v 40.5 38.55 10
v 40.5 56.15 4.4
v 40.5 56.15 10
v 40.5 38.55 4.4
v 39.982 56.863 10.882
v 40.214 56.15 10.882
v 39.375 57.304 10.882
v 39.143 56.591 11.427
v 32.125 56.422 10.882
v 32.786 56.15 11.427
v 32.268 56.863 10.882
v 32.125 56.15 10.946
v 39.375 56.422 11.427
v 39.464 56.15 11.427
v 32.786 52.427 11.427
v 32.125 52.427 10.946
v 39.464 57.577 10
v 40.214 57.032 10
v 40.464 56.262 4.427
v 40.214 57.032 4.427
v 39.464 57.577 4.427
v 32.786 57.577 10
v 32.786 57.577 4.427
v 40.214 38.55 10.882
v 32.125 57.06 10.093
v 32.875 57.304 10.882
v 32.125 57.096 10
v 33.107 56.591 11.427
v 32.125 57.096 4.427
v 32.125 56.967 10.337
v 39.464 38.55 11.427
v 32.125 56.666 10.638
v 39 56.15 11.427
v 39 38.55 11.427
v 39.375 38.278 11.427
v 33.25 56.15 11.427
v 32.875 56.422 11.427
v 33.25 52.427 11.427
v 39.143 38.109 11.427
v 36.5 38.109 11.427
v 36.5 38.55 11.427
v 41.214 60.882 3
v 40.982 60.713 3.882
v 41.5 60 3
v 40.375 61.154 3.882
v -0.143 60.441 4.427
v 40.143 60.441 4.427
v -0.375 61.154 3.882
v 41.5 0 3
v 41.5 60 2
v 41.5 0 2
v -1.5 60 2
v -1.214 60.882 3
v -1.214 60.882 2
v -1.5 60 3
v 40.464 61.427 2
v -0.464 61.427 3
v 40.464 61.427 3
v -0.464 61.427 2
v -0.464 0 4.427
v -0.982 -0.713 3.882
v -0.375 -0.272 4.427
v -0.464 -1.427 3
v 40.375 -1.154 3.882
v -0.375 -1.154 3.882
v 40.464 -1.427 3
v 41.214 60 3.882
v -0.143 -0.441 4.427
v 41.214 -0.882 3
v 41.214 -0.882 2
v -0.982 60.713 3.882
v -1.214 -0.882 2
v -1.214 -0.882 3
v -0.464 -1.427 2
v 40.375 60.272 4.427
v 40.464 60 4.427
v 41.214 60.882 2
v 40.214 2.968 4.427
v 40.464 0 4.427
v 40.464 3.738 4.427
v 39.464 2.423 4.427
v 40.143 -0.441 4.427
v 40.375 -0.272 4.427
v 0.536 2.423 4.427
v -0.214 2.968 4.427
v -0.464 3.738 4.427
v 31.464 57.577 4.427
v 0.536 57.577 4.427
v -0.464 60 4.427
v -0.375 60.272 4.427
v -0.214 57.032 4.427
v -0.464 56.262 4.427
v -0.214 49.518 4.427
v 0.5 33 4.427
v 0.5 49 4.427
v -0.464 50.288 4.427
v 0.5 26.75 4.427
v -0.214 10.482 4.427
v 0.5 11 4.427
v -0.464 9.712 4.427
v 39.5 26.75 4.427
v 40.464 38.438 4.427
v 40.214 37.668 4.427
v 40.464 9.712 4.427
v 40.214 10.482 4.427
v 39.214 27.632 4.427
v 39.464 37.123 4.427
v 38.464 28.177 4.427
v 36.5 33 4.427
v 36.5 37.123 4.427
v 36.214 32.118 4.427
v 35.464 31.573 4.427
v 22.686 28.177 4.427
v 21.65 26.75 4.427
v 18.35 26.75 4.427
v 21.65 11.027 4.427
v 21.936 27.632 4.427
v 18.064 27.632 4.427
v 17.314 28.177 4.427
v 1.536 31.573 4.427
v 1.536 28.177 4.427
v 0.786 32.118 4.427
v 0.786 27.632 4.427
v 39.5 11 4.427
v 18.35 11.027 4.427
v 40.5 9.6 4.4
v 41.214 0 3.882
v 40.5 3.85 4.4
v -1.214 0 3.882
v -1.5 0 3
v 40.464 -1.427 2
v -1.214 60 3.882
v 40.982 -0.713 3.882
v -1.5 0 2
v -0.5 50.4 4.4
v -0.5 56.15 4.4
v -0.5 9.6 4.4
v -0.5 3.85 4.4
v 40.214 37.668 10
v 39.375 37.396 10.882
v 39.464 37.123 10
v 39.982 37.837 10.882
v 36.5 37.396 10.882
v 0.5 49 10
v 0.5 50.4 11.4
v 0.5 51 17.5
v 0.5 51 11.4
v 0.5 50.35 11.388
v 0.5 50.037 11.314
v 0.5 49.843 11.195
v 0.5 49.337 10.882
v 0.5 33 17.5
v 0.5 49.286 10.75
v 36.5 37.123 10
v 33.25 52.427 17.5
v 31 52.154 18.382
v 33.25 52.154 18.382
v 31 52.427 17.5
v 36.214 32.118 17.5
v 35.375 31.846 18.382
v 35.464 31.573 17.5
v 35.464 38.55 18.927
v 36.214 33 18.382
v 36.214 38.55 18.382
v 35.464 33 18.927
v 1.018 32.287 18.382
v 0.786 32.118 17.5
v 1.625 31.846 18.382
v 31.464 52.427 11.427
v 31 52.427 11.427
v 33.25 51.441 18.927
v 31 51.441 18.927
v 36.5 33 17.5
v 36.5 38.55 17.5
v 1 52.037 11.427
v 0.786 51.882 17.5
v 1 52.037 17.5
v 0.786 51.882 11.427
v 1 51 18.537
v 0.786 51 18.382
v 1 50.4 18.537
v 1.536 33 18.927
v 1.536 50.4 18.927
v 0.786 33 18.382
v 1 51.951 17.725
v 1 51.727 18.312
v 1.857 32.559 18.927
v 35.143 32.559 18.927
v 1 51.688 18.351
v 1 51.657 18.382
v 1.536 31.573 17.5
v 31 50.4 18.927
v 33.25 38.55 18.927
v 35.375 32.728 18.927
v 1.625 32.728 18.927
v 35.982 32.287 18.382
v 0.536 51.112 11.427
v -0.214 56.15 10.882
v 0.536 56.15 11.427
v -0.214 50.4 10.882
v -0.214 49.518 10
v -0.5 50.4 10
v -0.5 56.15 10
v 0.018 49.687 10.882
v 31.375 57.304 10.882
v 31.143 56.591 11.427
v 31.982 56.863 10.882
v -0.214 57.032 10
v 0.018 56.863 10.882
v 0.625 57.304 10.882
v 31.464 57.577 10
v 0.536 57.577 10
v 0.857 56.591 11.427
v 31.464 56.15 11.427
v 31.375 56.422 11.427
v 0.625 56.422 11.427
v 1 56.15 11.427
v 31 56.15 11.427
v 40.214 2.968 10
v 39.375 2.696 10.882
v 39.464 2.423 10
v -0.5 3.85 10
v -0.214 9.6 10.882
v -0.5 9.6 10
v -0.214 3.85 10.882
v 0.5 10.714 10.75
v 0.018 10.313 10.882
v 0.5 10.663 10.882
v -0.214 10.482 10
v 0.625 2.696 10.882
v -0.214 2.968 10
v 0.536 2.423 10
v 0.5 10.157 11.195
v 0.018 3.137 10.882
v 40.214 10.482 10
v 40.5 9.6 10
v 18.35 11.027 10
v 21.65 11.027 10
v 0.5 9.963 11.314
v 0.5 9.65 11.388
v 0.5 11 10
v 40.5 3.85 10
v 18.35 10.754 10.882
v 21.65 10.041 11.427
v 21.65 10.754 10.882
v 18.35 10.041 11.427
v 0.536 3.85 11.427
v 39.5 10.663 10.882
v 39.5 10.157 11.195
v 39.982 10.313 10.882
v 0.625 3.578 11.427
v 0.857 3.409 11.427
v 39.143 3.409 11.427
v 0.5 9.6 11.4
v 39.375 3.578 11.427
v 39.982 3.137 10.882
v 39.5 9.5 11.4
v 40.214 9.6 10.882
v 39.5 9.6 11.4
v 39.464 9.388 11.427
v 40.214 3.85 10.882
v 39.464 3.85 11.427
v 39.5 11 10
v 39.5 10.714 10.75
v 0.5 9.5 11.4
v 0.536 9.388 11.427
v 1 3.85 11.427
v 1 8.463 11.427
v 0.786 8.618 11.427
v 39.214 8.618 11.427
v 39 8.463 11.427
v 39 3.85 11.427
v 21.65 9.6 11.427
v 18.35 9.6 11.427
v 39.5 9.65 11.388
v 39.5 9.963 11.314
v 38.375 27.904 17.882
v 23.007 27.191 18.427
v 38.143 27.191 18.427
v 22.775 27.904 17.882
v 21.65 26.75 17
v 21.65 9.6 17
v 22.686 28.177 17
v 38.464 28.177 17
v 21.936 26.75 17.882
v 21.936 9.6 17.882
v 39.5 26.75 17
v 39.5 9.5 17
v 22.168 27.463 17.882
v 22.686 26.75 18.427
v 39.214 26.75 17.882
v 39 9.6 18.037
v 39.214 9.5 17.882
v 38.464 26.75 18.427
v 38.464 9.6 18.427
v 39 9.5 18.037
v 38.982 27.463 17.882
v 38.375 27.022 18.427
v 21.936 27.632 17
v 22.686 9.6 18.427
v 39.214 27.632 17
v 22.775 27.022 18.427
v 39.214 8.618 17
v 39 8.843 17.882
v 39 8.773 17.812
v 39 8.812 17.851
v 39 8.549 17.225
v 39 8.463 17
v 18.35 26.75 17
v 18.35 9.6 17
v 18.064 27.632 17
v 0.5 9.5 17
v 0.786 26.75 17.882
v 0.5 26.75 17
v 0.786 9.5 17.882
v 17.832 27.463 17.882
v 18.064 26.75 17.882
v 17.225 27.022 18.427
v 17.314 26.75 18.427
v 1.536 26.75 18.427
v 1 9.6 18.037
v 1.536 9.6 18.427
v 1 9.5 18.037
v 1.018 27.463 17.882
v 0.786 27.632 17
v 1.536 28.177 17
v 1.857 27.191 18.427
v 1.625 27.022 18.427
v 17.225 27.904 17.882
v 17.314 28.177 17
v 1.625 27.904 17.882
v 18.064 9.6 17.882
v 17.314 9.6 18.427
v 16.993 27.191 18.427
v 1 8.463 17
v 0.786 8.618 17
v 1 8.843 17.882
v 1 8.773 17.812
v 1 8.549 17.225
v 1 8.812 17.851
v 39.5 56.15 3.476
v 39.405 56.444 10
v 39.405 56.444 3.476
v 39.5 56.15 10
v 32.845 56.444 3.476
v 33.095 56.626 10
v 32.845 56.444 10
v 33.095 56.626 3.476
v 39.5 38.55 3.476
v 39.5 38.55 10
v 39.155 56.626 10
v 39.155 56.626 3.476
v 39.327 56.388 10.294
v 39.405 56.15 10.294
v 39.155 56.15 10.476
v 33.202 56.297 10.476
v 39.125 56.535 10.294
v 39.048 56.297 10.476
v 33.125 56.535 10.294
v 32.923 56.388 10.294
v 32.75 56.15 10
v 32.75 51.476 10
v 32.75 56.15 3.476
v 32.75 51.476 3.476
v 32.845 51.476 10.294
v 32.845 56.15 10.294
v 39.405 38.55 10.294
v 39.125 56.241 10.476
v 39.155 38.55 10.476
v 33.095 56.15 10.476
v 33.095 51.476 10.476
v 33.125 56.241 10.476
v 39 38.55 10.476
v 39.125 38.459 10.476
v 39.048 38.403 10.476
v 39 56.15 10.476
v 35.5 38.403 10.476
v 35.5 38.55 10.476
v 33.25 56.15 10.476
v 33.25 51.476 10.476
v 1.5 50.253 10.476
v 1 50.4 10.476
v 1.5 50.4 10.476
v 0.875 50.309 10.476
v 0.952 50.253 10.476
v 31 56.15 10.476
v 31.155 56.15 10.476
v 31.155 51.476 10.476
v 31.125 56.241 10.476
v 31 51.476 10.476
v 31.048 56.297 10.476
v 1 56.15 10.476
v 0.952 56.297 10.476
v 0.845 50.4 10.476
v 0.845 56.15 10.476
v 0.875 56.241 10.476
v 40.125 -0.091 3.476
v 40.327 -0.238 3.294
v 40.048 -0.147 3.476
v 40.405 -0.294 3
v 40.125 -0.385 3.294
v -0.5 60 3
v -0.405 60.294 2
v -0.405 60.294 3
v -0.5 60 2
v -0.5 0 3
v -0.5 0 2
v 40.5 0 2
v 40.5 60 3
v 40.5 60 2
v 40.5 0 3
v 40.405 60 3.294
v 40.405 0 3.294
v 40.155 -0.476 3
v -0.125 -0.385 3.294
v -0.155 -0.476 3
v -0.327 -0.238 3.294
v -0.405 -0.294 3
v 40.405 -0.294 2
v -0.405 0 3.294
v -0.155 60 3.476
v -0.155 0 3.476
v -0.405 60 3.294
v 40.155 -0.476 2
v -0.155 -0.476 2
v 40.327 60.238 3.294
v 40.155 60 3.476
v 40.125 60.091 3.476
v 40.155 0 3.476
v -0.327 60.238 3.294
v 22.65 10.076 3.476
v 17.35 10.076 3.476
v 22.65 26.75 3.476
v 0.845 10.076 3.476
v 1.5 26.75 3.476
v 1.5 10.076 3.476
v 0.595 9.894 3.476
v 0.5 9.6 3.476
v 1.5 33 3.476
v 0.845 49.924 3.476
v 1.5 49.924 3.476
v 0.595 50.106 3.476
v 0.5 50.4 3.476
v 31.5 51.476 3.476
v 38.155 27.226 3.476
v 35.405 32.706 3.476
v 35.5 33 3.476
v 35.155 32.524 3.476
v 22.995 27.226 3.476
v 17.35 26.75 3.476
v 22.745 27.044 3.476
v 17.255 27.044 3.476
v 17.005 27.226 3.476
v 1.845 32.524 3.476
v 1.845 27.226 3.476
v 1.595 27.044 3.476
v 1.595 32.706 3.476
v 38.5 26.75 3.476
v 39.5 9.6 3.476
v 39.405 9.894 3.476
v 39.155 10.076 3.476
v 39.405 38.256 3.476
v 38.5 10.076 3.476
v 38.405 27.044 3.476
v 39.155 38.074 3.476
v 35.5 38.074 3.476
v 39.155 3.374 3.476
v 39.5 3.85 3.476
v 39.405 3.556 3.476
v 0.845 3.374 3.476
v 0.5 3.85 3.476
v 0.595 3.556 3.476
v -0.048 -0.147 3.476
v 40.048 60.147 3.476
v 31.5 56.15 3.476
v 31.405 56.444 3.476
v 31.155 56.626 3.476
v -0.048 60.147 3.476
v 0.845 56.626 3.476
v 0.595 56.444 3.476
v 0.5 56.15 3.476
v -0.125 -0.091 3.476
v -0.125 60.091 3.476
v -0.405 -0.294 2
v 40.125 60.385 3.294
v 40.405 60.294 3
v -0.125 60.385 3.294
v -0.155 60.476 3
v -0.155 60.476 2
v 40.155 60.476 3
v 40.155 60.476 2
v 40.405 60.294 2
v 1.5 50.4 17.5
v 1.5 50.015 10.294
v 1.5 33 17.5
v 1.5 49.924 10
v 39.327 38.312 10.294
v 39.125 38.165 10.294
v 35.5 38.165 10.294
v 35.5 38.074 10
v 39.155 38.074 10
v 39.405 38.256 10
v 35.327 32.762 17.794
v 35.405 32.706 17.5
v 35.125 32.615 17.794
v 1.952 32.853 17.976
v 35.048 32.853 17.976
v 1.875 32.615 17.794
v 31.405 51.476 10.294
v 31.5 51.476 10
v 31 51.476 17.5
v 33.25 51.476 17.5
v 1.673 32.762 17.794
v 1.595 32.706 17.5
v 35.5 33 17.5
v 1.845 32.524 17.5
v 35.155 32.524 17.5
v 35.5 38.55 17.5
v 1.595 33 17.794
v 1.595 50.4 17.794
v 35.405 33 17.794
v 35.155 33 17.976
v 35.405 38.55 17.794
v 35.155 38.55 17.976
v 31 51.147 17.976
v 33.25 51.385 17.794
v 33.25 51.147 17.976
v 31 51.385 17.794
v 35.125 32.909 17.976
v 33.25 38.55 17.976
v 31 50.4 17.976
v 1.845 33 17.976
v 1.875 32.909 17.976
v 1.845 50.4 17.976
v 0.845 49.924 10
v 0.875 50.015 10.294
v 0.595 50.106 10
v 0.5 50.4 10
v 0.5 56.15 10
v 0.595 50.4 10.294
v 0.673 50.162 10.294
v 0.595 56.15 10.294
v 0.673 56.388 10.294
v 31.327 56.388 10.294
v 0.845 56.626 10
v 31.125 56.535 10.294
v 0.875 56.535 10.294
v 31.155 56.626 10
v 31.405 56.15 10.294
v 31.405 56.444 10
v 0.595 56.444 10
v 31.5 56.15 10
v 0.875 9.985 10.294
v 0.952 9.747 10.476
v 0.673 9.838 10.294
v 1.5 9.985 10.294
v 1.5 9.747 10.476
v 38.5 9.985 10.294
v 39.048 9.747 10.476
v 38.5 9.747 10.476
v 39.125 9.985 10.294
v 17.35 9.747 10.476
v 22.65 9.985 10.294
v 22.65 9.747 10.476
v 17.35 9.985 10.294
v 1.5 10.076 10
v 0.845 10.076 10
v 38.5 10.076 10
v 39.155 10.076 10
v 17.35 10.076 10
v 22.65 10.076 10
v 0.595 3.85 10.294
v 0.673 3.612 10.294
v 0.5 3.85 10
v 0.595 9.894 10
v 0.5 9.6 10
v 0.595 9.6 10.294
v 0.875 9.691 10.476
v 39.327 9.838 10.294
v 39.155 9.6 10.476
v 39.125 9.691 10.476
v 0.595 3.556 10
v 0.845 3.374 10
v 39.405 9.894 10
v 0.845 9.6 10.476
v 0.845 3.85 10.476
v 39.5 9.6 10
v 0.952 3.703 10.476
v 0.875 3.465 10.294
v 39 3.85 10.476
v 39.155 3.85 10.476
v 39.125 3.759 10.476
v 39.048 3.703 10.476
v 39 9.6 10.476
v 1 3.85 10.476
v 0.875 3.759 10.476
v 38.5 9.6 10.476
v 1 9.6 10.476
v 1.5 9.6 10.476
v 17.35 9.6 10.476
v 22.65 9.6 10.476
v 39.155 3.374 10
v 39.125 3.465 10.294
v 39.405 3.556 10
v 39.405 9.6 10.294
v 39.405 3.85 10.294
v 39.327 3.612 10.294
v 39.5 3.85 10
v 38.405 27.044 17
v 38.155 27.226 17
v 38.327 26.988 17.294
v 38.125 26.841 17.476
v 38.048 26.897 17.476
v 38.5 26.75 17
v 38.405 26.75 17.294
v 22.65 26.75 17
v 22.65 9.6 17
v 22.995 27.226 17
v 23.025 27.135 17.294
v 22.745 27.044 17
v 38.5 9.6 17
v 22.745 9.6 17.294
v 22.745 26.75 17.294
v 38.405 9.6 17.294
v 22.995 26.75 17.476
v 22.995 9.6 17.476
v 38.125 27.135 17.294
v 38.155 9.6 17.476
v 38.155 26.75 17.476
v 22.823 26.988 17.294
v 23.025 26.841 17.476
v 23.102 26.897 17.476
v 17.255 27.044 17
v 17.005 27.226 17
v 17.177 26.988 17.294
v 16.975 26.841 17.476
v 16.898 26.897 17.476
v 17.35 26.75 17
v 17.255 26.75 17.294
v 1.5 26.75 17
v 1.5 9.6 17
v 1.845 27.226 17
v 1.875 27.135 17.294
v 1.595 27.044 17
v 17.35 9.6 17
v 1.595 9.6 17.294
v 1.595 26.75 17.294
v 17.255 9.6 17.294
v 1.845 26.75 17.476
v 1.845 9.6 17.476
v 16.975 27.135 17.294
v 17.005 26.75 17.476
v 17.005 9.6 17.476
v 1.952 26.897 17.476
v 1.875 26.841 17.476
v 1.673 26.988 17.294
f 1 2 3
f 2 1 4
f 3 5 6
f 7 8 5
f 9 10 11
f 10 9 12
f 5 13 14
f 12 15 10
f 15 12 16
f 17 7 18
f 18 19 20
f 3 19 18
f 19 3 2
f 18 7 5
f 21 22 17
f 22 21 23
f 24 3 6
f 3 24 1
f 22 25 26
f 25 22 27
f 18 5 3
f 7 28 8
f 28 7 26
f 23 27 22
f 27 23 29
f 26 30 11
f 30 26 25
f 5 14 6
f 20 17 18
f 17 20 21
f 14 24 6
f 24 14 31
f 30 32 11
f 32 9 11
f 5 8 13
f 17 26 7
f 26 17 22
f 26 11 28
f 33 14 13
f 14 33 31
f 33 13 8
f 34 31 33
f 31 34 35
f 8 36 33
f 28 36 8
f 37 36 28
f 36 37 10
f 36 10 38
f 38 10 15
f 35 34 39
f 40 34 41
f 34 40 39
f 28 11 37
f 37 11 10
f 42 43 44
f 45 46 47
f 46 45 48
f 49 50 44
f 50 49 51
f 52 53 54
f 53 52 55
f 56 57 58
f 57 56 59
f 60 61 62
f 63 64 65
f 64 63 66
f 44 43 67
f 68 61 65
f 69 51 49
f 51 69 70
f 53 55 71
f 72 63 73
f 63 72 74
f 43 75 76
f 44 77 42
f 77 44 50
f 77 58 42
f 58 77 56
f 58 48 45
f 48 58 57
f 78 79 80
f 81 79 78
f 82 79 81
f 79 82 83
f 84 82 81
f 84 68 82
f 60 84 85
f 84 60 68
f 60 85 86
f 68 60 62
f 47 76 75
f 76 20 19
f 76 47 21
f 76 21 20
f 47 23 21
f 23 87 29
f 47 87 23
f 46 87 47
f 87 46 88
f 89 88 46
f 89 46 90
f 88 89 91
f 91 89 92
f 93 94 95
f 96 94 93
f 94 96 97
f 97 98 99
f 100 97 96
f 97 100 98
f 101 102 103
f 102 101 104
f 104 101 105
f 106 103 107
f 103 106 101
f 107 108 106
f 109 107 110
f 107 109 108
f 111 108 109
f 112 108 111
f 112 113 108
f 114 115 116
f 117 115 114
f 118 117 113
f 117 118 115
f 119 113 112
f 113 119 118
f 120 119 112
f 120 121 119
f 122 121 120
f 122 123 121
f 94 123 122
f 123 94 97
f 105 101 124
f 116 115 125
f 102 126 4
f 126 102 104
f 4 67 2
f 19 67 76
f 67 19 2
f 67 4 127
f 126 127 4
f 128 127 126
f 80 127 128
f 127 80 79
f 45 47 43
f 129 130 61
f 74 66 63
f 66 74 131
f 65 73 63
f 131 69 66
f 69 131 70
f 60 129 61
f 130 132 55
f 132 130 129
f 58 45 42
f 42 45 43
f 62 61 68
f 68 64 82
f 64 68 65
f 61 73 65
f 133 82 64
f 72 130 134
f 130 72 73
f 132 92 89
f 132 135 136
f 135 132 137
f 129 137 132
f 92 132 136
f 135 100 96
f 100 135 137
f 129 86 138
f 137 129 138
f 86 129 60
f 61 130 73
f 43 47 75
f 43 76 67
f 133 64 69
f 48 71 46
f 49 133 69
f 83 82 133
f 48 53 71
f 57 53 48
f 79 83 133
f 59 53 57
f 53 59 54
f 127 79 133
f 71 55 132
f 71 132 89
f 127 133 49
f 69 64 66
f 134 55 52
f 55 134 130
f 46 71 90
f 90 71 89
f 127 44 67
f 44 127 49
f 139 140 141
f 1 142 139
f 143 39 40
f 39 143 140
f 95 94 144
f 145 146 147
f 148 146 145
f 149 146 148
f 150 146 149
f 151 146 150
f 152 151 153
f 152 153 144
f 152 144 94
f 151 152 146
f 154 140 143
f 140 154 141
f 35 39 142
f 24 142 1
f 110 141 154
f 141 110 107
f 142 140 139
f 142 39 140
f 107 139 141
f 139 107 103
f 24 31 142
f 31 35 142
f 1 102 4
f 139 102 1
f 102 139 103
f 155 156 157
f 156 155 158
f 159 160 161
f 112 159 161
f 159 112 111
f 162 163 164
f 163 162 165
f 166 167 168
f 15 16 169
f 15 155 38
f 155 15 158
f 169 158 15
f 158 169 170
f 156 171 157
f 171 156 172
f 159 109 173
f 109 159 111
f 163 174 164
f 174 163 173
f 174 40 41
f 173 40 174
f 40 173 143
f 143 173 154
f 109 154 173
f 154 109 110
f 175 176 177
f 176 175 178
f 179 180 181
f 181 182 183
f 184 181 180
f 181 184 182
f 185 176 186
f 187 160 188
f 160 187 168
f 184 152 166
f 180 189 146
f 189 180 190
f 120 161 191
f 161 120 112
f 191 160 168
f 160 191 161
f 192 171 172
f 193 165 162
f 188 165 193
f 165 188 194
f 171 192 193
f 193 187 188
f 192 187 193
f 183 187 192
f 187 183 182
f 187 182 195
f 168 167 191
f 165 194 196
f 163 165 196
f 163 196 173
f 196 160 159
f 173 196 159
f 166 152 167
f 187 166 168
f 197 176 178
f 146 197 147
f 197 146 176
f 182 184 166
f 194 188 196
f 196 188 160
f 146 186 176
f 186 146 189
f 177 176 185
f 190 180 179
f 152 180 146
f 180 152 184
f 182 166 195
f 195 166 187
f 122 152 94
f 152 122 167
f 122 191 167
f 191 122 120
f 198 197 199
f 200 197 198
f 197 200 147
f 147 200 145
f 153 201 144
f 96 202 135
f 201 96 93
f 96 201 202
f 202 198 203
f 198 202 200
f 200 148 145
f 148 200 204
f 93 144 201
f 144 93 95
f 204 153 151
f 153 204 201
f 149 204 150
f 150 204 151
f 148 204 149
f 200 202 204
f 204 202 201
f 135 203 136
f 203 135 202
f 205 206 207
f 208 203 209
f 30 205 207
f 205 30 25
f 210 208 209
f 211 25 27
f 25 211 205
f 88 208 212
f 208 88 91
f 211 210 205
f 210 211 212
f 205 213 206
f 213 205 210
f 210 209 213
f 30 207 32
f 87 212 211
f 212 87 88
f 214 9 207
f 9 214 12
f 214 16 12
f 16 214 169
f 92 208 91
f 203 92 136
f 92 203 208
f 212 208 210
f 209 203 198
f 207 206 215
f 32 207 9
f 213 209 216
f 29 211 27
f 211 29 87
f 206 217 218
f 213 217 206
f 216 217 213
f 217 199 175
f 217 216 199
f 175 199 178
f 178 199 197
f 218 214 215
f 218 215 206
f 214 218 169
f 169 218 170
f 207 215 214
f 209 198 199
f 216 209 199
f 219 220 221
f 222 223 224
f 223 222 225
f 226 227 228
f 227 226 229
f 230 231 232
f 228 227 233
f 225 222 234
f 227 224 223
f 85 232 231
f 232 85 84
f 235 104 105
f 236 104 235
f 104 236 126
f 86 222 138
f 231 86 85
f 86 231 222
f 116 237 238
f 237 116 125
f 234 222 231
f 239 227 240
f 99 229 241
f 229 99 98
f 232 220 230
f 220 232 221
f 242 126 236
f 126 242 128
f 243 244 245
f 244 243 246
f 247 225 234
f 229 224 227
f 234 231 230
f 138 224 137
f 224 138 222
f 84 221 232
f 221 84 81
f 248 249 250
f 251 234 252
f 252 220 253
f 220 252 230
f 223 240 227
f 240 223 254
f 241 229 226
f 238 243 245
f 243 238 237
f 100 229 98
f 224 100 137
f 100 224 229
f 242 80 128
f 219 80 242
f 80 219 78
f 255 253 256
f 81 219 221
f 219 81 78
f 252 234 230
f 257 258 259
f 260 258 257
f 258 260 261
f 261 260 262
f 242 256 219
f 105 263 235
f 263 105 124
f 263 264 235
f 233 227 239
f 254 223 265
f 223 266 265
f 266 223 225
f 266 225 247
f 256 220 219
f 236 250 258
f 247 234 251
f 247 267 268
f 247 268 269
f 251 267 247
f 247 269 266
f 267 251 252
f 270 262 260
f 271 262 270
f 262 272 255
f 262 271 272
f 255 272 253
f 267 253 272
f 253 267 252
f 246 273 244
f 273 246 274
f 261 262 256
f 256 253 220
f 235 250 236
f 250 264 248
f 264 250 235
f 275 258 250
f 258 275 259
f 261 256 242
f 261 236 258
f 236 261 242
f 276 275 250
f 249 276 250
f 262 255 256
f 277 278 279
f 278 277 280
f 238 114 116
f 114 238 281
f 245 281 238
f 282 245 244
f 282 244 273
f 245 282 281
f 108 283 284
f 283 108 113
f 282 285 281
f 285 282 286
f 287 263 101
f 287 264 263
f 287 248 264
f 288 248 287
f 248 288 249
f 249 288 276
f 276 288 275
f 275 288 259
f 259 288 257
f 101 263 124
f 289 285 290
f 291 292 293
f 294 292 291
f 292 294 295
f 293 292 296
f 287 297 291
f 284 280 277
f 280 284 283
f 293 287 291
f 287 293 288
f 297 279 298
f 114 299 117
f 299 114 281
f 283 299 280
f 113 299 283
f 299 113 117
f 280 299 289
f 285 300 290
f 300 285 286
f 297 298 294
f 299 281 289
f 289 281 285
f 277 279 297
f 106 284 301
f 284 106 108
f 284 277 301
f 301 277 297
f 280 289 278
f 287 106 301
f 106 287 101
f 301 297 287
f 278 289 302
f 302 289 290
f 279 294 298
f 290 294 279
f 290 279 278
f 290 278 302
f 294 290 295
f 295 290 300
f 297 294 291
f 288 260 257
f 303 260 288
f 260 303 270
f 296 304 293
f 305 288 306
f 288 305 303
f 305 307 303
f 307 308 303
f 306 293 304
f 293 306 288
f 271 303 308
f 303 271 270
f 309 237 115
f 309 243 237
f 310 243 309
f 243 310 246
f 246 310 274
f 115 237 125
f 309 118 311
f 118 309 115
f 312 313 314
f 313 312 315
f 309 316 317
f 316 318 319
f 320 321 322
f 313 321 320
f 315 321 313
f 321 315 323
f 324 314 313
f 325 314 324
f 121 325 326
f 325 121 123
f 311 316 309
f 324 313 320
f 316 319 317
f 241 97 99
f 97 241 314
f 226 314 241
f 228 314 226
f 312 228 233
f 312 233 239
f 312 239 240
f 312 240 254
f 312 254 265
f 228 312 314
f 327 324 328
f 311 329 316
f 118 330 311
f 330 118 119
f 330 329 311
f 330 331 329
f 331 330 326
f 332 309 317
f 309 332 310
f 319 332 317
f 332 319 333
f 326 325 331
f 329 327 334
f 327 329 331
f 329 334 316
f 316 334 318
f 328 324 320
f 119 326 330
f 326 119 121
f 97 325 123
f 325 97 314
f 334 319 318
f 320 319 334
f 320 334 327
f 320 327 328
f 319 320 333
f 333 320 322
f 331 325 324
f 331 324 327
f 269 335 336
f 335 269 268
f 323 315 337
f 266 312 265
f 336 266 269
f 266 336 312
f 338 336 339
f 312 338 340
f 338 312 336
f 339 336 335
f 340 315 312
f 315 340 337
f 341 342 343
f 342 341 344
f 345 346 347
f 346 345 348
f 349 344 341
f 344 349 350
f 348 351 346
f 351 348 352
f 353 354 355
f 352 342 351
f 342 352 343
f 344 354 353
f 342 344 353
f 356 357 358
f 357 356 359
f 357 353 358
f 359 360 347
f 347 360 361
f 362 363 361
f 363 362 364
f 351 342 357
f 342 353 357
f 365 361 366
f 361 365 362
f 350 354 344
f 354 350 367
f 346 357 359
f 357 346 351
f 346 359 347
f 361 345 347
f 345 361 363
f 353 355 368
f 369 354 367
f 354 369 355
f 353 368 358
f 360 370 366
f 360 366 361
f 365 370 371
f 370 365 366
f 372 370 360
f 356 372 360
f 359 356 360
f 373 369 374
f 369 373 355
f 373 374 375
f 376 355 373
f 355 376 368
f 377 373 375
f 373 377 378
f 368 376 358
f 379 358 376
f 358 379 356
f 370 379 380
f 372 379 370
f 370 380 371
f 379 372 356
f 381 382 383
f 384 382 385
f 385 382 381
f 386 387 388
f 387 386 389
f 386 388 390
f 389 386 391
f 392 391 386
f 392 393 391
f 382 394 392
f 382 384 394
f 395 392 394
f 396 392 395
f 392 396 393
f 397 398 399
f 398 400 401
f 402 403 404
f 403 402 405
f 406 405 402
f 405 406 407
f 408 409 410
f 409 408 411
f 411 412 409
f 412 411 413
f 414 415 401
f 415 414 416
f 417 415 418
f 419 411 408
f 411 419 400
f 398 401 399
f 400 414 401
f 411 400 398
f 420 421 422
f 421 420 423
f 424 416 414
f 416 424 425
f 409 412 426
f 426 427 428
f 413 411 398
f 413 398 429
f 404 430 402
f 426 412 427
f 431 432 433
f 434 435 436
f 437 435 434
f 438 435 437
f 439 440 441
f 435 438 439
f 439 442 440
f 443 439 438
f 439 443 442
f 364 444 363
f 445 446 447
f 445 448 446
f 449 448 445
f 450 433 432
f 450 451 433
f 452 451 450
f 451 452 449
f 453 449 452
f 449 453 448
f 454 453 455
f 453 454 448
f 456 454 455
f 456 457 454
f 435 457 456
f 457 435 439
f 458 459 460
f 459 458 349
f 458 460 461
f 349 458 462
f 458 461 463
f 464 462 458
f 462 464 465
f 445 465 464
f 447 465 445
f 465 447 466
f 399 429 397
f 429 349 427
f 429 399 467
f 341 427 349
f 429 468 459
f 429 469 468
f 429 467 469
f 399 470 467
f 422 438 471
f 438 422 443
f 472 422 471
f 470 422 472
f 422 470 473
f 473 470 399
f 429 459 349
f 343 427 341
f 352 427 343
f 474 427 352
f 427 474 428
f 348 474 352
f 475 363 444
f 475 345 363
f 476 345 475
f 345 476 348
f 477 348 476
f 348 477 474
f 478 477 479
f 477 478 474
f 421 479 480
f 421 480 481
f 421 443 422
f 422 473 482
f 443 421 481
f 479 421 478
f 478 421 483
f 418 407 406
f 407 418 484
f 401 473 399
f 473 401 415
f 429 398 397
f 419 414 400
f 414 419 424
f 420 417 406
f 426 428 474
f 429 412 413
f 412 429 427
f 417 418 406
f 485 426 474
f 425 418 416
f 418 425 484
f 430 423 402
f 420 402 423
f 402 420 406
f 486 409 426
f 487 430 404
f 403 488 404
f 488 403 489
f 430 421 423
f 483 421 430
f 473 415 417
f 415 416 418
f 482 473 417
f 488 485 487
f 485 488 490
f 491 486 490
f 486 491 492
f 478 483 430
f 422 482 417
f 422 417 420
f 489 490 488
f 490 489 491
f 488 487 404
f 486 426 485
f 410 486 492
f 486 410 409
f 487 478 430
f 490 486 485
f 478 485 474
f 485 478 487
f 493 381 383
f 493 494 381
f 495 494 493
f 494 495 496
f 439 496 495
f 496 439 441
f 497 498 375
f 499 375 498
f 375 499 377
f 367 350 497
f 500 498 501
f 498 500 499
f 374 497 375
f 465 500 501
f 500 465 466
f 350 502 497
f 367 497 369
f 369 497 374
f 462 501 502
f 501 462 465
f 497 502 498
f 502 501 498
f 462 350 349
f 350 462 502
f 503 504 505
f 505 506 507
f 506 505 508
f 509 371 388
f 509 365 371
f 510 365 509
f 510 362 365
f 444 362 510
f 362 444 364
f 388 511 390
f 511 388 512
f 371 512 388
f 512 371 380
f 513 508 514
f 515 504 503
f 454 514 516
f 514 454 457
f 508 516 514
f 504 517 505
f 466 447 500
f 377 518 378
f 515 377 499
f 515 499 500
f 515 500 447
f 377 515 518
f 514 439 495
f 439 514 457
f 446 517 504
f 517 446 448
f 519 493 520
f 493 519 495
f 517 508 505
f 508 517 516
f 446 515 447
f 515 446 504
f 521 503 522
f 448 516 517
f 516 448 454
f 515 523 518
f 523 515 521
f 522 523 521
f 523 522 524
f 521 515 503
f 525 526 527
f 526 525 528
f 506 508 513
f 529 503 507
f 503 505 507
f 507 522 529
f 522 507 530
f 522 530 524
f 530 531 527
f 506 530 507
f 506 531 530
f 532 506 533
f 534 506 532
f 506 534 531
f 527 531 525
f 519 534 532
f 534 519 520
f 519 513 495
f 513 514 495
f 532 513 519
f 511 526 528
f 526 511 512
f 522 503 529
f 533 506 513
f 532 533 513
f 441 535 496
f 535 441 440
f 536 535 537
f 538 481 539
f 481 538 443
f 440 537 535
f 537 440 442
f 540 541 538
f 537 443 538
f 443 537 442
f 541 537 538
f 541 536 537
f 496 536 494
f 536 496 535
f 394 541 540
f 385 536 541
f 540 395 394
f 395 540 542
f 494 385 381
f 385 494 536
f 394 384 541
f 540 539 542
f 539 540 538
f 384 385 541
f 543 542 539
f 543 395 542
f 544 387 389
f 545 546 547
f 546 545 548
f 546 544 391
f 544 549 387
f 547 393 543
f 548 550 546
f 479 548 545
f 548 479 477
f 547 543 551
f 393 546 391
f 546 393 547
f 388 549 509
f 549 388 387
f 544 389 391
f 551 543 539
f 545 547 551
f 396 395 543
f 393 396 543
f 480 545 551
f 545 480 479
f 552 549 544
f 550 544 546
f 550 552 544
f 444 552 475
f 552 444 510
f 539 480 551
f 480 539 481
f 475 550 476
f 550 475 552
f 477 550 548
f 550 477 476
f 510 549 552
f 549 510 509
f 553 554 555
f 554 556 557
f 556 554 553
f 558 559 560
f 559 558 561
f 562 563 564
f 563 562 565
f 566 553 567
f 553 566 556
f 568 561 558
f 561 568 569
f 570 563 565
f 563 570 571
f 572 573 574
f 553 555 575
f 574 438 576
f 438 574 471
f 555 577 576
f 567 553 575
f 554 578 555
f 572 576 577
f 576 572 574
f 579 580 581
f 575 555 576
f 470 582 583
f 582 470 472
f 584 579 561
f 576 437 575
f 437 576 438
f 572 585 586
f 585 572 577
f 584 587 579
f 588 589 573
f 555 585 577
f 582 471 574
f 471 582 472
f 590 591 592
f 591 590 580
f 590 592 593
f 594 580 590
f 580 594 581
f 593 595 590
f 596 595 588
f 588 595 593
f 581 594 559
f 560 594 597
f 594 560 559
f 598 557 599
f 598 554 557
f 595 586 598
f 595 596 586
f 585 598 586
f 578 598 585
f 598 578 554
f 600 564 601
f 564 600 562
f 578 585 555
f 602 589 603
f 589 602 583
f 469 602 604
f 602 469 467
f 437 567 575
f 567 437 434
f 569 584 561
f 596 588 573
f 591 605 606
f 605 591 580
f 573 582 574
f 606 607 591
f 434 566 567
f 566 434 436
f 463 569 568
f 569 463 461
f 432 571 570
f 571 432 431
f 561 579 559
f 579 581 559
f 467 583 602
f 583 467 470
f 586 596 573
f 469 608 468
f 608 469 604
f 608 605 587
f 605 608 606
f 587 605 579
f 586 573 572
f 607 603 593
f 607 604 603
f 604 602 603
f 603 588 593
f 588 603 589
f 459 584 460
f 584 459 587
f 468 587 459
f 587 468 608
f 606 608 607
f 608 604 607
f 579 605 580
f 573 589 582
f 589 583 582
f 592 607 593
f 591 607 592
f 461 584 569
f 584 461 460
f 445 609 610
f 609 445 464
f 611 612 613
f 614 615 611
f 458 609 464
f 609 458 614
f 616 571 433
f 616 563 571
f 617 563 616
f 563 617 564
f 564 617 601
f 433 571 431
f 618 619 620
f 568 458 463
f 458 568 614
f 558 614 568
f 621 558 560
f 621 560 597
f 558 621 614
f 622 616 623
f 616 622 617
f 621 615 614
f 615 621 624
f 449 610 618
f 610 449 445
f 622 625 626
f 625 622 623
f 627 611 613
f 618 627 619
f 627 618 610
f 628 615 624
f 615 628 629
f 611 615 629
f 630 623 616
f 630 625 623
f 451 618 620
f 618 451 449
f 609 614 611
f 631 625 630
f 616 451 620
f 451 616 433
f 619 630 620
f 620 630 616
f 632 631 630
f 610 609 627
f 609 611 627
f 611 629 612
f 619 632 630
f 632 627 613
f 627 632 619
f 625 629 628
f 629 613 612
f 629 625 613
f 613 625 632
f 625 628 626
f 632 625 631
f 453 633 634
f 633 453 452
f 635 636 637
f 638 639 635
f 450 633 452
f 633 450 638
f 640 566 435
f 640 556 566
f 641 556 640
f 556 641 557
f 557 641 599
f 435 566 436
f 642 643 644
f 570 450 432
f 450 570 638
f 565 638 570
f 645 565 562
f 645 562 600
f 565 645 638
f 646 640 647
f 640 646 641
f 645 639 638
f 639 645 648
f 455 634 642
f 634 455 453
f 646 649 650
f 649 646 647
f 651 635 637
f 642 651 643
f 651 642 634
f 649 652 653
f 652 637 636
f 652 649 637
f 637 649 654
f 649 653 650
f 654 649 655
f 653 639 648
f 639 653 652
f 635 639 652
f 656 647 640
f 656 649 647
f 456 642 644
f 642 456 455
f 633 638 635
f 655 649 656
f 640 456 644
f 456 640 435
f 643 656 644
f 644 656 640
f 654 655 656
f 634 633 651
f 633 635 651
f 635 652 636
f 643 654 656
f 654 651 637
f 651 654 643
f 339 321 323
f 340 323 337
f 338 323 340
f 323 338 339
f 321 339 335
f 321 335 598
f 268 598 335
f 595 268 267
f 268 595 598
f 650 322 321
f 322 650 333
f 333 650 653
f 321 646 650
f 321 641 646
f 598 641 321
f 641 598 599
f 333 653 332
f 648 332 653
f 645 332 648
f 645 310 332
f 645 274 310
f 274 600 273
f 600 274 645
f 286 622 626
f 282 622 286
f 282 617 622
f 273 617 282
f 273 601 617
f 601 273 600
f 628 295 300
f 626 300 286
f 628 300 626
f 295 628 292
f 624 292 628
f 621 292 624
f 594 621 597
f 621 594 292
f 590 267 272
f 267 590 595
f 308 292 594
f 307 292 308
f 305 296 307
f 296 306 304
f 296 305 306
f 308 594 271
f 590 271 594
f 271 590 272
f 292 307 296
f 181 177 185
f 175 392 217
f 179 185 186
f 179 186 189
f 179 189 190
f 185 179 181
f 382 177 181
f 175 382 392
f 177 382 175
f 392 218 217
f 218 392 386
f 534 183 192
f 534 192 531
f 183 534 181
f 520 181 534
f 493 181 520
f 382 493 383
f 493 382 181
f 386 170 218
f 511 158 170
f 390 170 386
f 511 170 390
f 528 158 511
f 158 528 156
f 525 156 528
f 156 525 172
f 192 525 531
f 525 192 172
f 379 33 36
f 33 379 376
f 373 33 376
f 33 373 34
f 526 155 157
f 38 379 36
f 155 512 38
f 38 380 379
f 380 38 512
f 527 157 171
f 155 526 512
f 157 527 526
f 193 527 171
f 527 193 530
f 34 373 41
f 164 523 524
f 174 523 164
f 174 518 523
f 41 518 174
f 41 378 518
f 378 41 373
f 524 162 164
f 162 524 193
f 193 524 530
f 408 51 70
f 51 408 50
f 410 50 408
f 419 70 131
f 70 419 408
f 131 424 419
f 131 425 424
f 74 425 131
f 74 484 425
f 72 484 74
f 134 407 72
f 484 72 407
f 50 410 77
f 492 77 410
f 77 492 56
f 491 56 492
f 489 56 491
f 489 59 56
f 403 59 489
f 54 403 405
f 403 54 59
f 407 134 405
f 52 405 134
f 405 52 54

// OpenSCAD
$fn=10;

// dimensions

// space between objects and wall
SPACING = 1;
WALL_THICKNESS = 2;
CASE_HEIGHT = 5;

// PLUGS
PLUG2_X = 7.6;
PLUG3_X = 10;
PLUG_Y = 5.75;
PLUG_Z = 7;
PLUGS_DISTANCE_Y = 3.85;
PLUGS_DISTANCE_X = 1;

// SERIAL CONNECTOR
SERIAL_X = 14.85;
SERIAL_Y = 8.5;
SERIAL_Z = 3.5;

// MAINBOARD
BOARD_X = 40;
BOARD_Y = 60;
BOARD_Z = 2;
CABLE_Z = 1;

// NOTOR DRIVER
MOTOR_DRIVER_X = 14.85;
MOTOR_DRIVER_Y = 17.25;
MOTOR_DRIVER_Z = 14;
MOTOR_DRIVER_DISTANCE_X = 2;
MOTOR_DRIVER_DISTANCE_Y = 9.5;

// ARDUINO
ARDUINO_MINI_X = 33;
ARDUINO_MINI_Y = 18;
ARDUINO_MINI_Z = 14.5;
ARDUINO_MINI_DISTANCE_X = 2;
ARDUINO_MINI_DISTANCE_Y = 33;



// derived dimensions
COVER_HEIGHT = 2 * SPACING
             + 2 * WALL_THICKNESS
             + max(PLUG_Z,
                   SERIAL_Z + ARDUINO_MINI_Z,
                   MOTOR_DRIVER_Z)
             - CASE_HEIGHT;

// locations
PLUGROW_1 = ([PLUGS_DISTANCE_X,
              PLUGS_DISTANCE_Y,
              BOARD_Z + CABLE_Z]);
              
PLUGROW_2 = ([PLUGS_DISTANCE_X,
              BOARD_Y - PLUGS_DISTANCE_Y - PLUG_Y,
              BOARD_Z + CABLE_Z]);
              
PLUGROW_3 = ([BOARD_X - PLUG_Y - PLUGS_DISTANCE_X,
              BOARD_Y - PLUGS_DISTANCE_Y,
              BOARD_Z + CABLE_Z]);
              
MOTOR_DRIVER_1 = ([MOTOR_DRIVER_DISTANCE_X,
                   MOTOR_DRIVER_DISTANCE_Y,
                   BOARD_Z + CABLE_Z]);
                   
MOTOR_DRIVER_2 = ([BOARD_X - MOTOR_DRIVER_X - MOTOR_DRIVER_DISTANCE_X,
                   MOTOR_DRIVER_DISTANCE_Y,
                   BOARD_Z + CABLE_Z]);
                   
ARDUINO_MINI = ([ARDUINO_MINI_DISTANCE_X, ARDUINO_MINI_DISTANCE_Y, BOARD_Z + CABLE_Z]);
                   
BOARD = ([0 ,0, CABLE_Z]);
CABLE = ([0, 0, 0]);

// objects

//COVER
difference(){
    difference(){
        minkowski(){
            driver_board();
            sphere(SPACING/2 + WALL_THICKNESS/2);
        }

        union(){
            minkowski(){
                driver_board();
                sphere(SPACING/2);
            }
            holes();
        }
    }

    translate([- (SPACING + WALL_THICKNESS),
               - (SPACING + WALL_THICKNESS),
               - (SPACING + WALL_THICKNESS)]){
        cube([BOARD_X + 2 * (SPACING + WALL_THICKNESS),
              BOARD_Y + 2 * (SPACING + WALL_THICKNESS),
              CASE_HEIGHT]);
    }
}

//CASE
*difference(){
    difference(){
        minkowski(){
            driver_board();
            sphere(SPACING/2 + WALL_THICKNESS/2);
        }
        
        minkowski(){
            driver_board();
            sphere(SPACING/2);
        }
    }
    
    translate([- (SPACING + WALL_THICKNESS),
           - (SPACING + WALL_THICKNESS),
           - (SPACING + WALL_THICKNESS) + CASE_HEIGHT]){
        cube([BOARD_X + 2 * (SPACING + WALL_THICKNESS),
              BOARD_Y + 2 * (SPACING + WALL_THICKNESS),
              COVER_HEIGHT]);
    }       
}

// modules
module driver_board(){
    union(){
        //CABLE
        translate(CABLE){
            translate([1,1,0]) cube([BOARD_X - 2, BOARD_Y - 2 , CABLE_Z]);
        }

        //BOARD
        translate(BOARD){
            cube([BOARD_X, BOARD_Y, BOARD_Z]);
        }

        // ARDUINO_MINI

        translate(ARDUINO_MINI){
            arduino_mini();
        }


        //MOTOR_DRIVER_1
        translate(MOTOR_DRIVER_1){
            motor_driver();
        }


        //MOTOR_DRIVER_2
        translate(MOTOR_DRIVER_2){
            motor_driver();
        }

        //PLUGROW_1
        translate(PLUGROW_1){
            plugrow1();
        }
        
        //PLUGROW_2
        translate(PLUGROW_2){
            plugrow2();
        }
        
        //PLUGROW_3
        translate(PLUGROW_3){
            plugrow3();
        }
    }
}

module plug2(){
    cube([PLUG2_X, PLUG_Y, PLUG_Z]);
}

module plug3(){
    cube([PLUG3_X, PLUG_Y, PLUG_Z]);
}

module plugrow1(){    
    for (i = [0:4]) {
        translate([i * PLUG2_X, 0, 0])plug2();
    }
    translate([- PLUG2_X, 0, 0])text("1");
}

module plugrow2(){
    for (i = [0:2]) {
        translate([i * PLUG3_X, 0, 0])plug3();
    }
    translate([- PLUG3_X, 0, 0])text("2");
}

module plugrow3(){
    rotate(270){
        plug3();
        translate([PLUG3_X, 0, 0])plug2();
    }
    translate([PLUG_Y, 0, 0])text("3");
}

module motor_driver(){
    cube([MOTOR_DRIVER_X, MOTOR_DRIVER_Y, MOTOR_DRIVER_Z]);
}

module arduino_mini(){
    cube([ARDUINO_MINI_X, ARDUINO_MINI_Y, ARDUINO_MINI_Z]);
}

module holes(){
    translate([0,0,PLUG_Z]){
        translate(PLUGROW_1){
            scale([1,1,2]) plugrow1();
        }
        
        translate(PLUGROW_2){
            scale([1,1,2]) plugrow2();
        }
        
        translate(PLUGROW_3){
            scale([1,1,2]) plugrow3();
        }
    }
}
